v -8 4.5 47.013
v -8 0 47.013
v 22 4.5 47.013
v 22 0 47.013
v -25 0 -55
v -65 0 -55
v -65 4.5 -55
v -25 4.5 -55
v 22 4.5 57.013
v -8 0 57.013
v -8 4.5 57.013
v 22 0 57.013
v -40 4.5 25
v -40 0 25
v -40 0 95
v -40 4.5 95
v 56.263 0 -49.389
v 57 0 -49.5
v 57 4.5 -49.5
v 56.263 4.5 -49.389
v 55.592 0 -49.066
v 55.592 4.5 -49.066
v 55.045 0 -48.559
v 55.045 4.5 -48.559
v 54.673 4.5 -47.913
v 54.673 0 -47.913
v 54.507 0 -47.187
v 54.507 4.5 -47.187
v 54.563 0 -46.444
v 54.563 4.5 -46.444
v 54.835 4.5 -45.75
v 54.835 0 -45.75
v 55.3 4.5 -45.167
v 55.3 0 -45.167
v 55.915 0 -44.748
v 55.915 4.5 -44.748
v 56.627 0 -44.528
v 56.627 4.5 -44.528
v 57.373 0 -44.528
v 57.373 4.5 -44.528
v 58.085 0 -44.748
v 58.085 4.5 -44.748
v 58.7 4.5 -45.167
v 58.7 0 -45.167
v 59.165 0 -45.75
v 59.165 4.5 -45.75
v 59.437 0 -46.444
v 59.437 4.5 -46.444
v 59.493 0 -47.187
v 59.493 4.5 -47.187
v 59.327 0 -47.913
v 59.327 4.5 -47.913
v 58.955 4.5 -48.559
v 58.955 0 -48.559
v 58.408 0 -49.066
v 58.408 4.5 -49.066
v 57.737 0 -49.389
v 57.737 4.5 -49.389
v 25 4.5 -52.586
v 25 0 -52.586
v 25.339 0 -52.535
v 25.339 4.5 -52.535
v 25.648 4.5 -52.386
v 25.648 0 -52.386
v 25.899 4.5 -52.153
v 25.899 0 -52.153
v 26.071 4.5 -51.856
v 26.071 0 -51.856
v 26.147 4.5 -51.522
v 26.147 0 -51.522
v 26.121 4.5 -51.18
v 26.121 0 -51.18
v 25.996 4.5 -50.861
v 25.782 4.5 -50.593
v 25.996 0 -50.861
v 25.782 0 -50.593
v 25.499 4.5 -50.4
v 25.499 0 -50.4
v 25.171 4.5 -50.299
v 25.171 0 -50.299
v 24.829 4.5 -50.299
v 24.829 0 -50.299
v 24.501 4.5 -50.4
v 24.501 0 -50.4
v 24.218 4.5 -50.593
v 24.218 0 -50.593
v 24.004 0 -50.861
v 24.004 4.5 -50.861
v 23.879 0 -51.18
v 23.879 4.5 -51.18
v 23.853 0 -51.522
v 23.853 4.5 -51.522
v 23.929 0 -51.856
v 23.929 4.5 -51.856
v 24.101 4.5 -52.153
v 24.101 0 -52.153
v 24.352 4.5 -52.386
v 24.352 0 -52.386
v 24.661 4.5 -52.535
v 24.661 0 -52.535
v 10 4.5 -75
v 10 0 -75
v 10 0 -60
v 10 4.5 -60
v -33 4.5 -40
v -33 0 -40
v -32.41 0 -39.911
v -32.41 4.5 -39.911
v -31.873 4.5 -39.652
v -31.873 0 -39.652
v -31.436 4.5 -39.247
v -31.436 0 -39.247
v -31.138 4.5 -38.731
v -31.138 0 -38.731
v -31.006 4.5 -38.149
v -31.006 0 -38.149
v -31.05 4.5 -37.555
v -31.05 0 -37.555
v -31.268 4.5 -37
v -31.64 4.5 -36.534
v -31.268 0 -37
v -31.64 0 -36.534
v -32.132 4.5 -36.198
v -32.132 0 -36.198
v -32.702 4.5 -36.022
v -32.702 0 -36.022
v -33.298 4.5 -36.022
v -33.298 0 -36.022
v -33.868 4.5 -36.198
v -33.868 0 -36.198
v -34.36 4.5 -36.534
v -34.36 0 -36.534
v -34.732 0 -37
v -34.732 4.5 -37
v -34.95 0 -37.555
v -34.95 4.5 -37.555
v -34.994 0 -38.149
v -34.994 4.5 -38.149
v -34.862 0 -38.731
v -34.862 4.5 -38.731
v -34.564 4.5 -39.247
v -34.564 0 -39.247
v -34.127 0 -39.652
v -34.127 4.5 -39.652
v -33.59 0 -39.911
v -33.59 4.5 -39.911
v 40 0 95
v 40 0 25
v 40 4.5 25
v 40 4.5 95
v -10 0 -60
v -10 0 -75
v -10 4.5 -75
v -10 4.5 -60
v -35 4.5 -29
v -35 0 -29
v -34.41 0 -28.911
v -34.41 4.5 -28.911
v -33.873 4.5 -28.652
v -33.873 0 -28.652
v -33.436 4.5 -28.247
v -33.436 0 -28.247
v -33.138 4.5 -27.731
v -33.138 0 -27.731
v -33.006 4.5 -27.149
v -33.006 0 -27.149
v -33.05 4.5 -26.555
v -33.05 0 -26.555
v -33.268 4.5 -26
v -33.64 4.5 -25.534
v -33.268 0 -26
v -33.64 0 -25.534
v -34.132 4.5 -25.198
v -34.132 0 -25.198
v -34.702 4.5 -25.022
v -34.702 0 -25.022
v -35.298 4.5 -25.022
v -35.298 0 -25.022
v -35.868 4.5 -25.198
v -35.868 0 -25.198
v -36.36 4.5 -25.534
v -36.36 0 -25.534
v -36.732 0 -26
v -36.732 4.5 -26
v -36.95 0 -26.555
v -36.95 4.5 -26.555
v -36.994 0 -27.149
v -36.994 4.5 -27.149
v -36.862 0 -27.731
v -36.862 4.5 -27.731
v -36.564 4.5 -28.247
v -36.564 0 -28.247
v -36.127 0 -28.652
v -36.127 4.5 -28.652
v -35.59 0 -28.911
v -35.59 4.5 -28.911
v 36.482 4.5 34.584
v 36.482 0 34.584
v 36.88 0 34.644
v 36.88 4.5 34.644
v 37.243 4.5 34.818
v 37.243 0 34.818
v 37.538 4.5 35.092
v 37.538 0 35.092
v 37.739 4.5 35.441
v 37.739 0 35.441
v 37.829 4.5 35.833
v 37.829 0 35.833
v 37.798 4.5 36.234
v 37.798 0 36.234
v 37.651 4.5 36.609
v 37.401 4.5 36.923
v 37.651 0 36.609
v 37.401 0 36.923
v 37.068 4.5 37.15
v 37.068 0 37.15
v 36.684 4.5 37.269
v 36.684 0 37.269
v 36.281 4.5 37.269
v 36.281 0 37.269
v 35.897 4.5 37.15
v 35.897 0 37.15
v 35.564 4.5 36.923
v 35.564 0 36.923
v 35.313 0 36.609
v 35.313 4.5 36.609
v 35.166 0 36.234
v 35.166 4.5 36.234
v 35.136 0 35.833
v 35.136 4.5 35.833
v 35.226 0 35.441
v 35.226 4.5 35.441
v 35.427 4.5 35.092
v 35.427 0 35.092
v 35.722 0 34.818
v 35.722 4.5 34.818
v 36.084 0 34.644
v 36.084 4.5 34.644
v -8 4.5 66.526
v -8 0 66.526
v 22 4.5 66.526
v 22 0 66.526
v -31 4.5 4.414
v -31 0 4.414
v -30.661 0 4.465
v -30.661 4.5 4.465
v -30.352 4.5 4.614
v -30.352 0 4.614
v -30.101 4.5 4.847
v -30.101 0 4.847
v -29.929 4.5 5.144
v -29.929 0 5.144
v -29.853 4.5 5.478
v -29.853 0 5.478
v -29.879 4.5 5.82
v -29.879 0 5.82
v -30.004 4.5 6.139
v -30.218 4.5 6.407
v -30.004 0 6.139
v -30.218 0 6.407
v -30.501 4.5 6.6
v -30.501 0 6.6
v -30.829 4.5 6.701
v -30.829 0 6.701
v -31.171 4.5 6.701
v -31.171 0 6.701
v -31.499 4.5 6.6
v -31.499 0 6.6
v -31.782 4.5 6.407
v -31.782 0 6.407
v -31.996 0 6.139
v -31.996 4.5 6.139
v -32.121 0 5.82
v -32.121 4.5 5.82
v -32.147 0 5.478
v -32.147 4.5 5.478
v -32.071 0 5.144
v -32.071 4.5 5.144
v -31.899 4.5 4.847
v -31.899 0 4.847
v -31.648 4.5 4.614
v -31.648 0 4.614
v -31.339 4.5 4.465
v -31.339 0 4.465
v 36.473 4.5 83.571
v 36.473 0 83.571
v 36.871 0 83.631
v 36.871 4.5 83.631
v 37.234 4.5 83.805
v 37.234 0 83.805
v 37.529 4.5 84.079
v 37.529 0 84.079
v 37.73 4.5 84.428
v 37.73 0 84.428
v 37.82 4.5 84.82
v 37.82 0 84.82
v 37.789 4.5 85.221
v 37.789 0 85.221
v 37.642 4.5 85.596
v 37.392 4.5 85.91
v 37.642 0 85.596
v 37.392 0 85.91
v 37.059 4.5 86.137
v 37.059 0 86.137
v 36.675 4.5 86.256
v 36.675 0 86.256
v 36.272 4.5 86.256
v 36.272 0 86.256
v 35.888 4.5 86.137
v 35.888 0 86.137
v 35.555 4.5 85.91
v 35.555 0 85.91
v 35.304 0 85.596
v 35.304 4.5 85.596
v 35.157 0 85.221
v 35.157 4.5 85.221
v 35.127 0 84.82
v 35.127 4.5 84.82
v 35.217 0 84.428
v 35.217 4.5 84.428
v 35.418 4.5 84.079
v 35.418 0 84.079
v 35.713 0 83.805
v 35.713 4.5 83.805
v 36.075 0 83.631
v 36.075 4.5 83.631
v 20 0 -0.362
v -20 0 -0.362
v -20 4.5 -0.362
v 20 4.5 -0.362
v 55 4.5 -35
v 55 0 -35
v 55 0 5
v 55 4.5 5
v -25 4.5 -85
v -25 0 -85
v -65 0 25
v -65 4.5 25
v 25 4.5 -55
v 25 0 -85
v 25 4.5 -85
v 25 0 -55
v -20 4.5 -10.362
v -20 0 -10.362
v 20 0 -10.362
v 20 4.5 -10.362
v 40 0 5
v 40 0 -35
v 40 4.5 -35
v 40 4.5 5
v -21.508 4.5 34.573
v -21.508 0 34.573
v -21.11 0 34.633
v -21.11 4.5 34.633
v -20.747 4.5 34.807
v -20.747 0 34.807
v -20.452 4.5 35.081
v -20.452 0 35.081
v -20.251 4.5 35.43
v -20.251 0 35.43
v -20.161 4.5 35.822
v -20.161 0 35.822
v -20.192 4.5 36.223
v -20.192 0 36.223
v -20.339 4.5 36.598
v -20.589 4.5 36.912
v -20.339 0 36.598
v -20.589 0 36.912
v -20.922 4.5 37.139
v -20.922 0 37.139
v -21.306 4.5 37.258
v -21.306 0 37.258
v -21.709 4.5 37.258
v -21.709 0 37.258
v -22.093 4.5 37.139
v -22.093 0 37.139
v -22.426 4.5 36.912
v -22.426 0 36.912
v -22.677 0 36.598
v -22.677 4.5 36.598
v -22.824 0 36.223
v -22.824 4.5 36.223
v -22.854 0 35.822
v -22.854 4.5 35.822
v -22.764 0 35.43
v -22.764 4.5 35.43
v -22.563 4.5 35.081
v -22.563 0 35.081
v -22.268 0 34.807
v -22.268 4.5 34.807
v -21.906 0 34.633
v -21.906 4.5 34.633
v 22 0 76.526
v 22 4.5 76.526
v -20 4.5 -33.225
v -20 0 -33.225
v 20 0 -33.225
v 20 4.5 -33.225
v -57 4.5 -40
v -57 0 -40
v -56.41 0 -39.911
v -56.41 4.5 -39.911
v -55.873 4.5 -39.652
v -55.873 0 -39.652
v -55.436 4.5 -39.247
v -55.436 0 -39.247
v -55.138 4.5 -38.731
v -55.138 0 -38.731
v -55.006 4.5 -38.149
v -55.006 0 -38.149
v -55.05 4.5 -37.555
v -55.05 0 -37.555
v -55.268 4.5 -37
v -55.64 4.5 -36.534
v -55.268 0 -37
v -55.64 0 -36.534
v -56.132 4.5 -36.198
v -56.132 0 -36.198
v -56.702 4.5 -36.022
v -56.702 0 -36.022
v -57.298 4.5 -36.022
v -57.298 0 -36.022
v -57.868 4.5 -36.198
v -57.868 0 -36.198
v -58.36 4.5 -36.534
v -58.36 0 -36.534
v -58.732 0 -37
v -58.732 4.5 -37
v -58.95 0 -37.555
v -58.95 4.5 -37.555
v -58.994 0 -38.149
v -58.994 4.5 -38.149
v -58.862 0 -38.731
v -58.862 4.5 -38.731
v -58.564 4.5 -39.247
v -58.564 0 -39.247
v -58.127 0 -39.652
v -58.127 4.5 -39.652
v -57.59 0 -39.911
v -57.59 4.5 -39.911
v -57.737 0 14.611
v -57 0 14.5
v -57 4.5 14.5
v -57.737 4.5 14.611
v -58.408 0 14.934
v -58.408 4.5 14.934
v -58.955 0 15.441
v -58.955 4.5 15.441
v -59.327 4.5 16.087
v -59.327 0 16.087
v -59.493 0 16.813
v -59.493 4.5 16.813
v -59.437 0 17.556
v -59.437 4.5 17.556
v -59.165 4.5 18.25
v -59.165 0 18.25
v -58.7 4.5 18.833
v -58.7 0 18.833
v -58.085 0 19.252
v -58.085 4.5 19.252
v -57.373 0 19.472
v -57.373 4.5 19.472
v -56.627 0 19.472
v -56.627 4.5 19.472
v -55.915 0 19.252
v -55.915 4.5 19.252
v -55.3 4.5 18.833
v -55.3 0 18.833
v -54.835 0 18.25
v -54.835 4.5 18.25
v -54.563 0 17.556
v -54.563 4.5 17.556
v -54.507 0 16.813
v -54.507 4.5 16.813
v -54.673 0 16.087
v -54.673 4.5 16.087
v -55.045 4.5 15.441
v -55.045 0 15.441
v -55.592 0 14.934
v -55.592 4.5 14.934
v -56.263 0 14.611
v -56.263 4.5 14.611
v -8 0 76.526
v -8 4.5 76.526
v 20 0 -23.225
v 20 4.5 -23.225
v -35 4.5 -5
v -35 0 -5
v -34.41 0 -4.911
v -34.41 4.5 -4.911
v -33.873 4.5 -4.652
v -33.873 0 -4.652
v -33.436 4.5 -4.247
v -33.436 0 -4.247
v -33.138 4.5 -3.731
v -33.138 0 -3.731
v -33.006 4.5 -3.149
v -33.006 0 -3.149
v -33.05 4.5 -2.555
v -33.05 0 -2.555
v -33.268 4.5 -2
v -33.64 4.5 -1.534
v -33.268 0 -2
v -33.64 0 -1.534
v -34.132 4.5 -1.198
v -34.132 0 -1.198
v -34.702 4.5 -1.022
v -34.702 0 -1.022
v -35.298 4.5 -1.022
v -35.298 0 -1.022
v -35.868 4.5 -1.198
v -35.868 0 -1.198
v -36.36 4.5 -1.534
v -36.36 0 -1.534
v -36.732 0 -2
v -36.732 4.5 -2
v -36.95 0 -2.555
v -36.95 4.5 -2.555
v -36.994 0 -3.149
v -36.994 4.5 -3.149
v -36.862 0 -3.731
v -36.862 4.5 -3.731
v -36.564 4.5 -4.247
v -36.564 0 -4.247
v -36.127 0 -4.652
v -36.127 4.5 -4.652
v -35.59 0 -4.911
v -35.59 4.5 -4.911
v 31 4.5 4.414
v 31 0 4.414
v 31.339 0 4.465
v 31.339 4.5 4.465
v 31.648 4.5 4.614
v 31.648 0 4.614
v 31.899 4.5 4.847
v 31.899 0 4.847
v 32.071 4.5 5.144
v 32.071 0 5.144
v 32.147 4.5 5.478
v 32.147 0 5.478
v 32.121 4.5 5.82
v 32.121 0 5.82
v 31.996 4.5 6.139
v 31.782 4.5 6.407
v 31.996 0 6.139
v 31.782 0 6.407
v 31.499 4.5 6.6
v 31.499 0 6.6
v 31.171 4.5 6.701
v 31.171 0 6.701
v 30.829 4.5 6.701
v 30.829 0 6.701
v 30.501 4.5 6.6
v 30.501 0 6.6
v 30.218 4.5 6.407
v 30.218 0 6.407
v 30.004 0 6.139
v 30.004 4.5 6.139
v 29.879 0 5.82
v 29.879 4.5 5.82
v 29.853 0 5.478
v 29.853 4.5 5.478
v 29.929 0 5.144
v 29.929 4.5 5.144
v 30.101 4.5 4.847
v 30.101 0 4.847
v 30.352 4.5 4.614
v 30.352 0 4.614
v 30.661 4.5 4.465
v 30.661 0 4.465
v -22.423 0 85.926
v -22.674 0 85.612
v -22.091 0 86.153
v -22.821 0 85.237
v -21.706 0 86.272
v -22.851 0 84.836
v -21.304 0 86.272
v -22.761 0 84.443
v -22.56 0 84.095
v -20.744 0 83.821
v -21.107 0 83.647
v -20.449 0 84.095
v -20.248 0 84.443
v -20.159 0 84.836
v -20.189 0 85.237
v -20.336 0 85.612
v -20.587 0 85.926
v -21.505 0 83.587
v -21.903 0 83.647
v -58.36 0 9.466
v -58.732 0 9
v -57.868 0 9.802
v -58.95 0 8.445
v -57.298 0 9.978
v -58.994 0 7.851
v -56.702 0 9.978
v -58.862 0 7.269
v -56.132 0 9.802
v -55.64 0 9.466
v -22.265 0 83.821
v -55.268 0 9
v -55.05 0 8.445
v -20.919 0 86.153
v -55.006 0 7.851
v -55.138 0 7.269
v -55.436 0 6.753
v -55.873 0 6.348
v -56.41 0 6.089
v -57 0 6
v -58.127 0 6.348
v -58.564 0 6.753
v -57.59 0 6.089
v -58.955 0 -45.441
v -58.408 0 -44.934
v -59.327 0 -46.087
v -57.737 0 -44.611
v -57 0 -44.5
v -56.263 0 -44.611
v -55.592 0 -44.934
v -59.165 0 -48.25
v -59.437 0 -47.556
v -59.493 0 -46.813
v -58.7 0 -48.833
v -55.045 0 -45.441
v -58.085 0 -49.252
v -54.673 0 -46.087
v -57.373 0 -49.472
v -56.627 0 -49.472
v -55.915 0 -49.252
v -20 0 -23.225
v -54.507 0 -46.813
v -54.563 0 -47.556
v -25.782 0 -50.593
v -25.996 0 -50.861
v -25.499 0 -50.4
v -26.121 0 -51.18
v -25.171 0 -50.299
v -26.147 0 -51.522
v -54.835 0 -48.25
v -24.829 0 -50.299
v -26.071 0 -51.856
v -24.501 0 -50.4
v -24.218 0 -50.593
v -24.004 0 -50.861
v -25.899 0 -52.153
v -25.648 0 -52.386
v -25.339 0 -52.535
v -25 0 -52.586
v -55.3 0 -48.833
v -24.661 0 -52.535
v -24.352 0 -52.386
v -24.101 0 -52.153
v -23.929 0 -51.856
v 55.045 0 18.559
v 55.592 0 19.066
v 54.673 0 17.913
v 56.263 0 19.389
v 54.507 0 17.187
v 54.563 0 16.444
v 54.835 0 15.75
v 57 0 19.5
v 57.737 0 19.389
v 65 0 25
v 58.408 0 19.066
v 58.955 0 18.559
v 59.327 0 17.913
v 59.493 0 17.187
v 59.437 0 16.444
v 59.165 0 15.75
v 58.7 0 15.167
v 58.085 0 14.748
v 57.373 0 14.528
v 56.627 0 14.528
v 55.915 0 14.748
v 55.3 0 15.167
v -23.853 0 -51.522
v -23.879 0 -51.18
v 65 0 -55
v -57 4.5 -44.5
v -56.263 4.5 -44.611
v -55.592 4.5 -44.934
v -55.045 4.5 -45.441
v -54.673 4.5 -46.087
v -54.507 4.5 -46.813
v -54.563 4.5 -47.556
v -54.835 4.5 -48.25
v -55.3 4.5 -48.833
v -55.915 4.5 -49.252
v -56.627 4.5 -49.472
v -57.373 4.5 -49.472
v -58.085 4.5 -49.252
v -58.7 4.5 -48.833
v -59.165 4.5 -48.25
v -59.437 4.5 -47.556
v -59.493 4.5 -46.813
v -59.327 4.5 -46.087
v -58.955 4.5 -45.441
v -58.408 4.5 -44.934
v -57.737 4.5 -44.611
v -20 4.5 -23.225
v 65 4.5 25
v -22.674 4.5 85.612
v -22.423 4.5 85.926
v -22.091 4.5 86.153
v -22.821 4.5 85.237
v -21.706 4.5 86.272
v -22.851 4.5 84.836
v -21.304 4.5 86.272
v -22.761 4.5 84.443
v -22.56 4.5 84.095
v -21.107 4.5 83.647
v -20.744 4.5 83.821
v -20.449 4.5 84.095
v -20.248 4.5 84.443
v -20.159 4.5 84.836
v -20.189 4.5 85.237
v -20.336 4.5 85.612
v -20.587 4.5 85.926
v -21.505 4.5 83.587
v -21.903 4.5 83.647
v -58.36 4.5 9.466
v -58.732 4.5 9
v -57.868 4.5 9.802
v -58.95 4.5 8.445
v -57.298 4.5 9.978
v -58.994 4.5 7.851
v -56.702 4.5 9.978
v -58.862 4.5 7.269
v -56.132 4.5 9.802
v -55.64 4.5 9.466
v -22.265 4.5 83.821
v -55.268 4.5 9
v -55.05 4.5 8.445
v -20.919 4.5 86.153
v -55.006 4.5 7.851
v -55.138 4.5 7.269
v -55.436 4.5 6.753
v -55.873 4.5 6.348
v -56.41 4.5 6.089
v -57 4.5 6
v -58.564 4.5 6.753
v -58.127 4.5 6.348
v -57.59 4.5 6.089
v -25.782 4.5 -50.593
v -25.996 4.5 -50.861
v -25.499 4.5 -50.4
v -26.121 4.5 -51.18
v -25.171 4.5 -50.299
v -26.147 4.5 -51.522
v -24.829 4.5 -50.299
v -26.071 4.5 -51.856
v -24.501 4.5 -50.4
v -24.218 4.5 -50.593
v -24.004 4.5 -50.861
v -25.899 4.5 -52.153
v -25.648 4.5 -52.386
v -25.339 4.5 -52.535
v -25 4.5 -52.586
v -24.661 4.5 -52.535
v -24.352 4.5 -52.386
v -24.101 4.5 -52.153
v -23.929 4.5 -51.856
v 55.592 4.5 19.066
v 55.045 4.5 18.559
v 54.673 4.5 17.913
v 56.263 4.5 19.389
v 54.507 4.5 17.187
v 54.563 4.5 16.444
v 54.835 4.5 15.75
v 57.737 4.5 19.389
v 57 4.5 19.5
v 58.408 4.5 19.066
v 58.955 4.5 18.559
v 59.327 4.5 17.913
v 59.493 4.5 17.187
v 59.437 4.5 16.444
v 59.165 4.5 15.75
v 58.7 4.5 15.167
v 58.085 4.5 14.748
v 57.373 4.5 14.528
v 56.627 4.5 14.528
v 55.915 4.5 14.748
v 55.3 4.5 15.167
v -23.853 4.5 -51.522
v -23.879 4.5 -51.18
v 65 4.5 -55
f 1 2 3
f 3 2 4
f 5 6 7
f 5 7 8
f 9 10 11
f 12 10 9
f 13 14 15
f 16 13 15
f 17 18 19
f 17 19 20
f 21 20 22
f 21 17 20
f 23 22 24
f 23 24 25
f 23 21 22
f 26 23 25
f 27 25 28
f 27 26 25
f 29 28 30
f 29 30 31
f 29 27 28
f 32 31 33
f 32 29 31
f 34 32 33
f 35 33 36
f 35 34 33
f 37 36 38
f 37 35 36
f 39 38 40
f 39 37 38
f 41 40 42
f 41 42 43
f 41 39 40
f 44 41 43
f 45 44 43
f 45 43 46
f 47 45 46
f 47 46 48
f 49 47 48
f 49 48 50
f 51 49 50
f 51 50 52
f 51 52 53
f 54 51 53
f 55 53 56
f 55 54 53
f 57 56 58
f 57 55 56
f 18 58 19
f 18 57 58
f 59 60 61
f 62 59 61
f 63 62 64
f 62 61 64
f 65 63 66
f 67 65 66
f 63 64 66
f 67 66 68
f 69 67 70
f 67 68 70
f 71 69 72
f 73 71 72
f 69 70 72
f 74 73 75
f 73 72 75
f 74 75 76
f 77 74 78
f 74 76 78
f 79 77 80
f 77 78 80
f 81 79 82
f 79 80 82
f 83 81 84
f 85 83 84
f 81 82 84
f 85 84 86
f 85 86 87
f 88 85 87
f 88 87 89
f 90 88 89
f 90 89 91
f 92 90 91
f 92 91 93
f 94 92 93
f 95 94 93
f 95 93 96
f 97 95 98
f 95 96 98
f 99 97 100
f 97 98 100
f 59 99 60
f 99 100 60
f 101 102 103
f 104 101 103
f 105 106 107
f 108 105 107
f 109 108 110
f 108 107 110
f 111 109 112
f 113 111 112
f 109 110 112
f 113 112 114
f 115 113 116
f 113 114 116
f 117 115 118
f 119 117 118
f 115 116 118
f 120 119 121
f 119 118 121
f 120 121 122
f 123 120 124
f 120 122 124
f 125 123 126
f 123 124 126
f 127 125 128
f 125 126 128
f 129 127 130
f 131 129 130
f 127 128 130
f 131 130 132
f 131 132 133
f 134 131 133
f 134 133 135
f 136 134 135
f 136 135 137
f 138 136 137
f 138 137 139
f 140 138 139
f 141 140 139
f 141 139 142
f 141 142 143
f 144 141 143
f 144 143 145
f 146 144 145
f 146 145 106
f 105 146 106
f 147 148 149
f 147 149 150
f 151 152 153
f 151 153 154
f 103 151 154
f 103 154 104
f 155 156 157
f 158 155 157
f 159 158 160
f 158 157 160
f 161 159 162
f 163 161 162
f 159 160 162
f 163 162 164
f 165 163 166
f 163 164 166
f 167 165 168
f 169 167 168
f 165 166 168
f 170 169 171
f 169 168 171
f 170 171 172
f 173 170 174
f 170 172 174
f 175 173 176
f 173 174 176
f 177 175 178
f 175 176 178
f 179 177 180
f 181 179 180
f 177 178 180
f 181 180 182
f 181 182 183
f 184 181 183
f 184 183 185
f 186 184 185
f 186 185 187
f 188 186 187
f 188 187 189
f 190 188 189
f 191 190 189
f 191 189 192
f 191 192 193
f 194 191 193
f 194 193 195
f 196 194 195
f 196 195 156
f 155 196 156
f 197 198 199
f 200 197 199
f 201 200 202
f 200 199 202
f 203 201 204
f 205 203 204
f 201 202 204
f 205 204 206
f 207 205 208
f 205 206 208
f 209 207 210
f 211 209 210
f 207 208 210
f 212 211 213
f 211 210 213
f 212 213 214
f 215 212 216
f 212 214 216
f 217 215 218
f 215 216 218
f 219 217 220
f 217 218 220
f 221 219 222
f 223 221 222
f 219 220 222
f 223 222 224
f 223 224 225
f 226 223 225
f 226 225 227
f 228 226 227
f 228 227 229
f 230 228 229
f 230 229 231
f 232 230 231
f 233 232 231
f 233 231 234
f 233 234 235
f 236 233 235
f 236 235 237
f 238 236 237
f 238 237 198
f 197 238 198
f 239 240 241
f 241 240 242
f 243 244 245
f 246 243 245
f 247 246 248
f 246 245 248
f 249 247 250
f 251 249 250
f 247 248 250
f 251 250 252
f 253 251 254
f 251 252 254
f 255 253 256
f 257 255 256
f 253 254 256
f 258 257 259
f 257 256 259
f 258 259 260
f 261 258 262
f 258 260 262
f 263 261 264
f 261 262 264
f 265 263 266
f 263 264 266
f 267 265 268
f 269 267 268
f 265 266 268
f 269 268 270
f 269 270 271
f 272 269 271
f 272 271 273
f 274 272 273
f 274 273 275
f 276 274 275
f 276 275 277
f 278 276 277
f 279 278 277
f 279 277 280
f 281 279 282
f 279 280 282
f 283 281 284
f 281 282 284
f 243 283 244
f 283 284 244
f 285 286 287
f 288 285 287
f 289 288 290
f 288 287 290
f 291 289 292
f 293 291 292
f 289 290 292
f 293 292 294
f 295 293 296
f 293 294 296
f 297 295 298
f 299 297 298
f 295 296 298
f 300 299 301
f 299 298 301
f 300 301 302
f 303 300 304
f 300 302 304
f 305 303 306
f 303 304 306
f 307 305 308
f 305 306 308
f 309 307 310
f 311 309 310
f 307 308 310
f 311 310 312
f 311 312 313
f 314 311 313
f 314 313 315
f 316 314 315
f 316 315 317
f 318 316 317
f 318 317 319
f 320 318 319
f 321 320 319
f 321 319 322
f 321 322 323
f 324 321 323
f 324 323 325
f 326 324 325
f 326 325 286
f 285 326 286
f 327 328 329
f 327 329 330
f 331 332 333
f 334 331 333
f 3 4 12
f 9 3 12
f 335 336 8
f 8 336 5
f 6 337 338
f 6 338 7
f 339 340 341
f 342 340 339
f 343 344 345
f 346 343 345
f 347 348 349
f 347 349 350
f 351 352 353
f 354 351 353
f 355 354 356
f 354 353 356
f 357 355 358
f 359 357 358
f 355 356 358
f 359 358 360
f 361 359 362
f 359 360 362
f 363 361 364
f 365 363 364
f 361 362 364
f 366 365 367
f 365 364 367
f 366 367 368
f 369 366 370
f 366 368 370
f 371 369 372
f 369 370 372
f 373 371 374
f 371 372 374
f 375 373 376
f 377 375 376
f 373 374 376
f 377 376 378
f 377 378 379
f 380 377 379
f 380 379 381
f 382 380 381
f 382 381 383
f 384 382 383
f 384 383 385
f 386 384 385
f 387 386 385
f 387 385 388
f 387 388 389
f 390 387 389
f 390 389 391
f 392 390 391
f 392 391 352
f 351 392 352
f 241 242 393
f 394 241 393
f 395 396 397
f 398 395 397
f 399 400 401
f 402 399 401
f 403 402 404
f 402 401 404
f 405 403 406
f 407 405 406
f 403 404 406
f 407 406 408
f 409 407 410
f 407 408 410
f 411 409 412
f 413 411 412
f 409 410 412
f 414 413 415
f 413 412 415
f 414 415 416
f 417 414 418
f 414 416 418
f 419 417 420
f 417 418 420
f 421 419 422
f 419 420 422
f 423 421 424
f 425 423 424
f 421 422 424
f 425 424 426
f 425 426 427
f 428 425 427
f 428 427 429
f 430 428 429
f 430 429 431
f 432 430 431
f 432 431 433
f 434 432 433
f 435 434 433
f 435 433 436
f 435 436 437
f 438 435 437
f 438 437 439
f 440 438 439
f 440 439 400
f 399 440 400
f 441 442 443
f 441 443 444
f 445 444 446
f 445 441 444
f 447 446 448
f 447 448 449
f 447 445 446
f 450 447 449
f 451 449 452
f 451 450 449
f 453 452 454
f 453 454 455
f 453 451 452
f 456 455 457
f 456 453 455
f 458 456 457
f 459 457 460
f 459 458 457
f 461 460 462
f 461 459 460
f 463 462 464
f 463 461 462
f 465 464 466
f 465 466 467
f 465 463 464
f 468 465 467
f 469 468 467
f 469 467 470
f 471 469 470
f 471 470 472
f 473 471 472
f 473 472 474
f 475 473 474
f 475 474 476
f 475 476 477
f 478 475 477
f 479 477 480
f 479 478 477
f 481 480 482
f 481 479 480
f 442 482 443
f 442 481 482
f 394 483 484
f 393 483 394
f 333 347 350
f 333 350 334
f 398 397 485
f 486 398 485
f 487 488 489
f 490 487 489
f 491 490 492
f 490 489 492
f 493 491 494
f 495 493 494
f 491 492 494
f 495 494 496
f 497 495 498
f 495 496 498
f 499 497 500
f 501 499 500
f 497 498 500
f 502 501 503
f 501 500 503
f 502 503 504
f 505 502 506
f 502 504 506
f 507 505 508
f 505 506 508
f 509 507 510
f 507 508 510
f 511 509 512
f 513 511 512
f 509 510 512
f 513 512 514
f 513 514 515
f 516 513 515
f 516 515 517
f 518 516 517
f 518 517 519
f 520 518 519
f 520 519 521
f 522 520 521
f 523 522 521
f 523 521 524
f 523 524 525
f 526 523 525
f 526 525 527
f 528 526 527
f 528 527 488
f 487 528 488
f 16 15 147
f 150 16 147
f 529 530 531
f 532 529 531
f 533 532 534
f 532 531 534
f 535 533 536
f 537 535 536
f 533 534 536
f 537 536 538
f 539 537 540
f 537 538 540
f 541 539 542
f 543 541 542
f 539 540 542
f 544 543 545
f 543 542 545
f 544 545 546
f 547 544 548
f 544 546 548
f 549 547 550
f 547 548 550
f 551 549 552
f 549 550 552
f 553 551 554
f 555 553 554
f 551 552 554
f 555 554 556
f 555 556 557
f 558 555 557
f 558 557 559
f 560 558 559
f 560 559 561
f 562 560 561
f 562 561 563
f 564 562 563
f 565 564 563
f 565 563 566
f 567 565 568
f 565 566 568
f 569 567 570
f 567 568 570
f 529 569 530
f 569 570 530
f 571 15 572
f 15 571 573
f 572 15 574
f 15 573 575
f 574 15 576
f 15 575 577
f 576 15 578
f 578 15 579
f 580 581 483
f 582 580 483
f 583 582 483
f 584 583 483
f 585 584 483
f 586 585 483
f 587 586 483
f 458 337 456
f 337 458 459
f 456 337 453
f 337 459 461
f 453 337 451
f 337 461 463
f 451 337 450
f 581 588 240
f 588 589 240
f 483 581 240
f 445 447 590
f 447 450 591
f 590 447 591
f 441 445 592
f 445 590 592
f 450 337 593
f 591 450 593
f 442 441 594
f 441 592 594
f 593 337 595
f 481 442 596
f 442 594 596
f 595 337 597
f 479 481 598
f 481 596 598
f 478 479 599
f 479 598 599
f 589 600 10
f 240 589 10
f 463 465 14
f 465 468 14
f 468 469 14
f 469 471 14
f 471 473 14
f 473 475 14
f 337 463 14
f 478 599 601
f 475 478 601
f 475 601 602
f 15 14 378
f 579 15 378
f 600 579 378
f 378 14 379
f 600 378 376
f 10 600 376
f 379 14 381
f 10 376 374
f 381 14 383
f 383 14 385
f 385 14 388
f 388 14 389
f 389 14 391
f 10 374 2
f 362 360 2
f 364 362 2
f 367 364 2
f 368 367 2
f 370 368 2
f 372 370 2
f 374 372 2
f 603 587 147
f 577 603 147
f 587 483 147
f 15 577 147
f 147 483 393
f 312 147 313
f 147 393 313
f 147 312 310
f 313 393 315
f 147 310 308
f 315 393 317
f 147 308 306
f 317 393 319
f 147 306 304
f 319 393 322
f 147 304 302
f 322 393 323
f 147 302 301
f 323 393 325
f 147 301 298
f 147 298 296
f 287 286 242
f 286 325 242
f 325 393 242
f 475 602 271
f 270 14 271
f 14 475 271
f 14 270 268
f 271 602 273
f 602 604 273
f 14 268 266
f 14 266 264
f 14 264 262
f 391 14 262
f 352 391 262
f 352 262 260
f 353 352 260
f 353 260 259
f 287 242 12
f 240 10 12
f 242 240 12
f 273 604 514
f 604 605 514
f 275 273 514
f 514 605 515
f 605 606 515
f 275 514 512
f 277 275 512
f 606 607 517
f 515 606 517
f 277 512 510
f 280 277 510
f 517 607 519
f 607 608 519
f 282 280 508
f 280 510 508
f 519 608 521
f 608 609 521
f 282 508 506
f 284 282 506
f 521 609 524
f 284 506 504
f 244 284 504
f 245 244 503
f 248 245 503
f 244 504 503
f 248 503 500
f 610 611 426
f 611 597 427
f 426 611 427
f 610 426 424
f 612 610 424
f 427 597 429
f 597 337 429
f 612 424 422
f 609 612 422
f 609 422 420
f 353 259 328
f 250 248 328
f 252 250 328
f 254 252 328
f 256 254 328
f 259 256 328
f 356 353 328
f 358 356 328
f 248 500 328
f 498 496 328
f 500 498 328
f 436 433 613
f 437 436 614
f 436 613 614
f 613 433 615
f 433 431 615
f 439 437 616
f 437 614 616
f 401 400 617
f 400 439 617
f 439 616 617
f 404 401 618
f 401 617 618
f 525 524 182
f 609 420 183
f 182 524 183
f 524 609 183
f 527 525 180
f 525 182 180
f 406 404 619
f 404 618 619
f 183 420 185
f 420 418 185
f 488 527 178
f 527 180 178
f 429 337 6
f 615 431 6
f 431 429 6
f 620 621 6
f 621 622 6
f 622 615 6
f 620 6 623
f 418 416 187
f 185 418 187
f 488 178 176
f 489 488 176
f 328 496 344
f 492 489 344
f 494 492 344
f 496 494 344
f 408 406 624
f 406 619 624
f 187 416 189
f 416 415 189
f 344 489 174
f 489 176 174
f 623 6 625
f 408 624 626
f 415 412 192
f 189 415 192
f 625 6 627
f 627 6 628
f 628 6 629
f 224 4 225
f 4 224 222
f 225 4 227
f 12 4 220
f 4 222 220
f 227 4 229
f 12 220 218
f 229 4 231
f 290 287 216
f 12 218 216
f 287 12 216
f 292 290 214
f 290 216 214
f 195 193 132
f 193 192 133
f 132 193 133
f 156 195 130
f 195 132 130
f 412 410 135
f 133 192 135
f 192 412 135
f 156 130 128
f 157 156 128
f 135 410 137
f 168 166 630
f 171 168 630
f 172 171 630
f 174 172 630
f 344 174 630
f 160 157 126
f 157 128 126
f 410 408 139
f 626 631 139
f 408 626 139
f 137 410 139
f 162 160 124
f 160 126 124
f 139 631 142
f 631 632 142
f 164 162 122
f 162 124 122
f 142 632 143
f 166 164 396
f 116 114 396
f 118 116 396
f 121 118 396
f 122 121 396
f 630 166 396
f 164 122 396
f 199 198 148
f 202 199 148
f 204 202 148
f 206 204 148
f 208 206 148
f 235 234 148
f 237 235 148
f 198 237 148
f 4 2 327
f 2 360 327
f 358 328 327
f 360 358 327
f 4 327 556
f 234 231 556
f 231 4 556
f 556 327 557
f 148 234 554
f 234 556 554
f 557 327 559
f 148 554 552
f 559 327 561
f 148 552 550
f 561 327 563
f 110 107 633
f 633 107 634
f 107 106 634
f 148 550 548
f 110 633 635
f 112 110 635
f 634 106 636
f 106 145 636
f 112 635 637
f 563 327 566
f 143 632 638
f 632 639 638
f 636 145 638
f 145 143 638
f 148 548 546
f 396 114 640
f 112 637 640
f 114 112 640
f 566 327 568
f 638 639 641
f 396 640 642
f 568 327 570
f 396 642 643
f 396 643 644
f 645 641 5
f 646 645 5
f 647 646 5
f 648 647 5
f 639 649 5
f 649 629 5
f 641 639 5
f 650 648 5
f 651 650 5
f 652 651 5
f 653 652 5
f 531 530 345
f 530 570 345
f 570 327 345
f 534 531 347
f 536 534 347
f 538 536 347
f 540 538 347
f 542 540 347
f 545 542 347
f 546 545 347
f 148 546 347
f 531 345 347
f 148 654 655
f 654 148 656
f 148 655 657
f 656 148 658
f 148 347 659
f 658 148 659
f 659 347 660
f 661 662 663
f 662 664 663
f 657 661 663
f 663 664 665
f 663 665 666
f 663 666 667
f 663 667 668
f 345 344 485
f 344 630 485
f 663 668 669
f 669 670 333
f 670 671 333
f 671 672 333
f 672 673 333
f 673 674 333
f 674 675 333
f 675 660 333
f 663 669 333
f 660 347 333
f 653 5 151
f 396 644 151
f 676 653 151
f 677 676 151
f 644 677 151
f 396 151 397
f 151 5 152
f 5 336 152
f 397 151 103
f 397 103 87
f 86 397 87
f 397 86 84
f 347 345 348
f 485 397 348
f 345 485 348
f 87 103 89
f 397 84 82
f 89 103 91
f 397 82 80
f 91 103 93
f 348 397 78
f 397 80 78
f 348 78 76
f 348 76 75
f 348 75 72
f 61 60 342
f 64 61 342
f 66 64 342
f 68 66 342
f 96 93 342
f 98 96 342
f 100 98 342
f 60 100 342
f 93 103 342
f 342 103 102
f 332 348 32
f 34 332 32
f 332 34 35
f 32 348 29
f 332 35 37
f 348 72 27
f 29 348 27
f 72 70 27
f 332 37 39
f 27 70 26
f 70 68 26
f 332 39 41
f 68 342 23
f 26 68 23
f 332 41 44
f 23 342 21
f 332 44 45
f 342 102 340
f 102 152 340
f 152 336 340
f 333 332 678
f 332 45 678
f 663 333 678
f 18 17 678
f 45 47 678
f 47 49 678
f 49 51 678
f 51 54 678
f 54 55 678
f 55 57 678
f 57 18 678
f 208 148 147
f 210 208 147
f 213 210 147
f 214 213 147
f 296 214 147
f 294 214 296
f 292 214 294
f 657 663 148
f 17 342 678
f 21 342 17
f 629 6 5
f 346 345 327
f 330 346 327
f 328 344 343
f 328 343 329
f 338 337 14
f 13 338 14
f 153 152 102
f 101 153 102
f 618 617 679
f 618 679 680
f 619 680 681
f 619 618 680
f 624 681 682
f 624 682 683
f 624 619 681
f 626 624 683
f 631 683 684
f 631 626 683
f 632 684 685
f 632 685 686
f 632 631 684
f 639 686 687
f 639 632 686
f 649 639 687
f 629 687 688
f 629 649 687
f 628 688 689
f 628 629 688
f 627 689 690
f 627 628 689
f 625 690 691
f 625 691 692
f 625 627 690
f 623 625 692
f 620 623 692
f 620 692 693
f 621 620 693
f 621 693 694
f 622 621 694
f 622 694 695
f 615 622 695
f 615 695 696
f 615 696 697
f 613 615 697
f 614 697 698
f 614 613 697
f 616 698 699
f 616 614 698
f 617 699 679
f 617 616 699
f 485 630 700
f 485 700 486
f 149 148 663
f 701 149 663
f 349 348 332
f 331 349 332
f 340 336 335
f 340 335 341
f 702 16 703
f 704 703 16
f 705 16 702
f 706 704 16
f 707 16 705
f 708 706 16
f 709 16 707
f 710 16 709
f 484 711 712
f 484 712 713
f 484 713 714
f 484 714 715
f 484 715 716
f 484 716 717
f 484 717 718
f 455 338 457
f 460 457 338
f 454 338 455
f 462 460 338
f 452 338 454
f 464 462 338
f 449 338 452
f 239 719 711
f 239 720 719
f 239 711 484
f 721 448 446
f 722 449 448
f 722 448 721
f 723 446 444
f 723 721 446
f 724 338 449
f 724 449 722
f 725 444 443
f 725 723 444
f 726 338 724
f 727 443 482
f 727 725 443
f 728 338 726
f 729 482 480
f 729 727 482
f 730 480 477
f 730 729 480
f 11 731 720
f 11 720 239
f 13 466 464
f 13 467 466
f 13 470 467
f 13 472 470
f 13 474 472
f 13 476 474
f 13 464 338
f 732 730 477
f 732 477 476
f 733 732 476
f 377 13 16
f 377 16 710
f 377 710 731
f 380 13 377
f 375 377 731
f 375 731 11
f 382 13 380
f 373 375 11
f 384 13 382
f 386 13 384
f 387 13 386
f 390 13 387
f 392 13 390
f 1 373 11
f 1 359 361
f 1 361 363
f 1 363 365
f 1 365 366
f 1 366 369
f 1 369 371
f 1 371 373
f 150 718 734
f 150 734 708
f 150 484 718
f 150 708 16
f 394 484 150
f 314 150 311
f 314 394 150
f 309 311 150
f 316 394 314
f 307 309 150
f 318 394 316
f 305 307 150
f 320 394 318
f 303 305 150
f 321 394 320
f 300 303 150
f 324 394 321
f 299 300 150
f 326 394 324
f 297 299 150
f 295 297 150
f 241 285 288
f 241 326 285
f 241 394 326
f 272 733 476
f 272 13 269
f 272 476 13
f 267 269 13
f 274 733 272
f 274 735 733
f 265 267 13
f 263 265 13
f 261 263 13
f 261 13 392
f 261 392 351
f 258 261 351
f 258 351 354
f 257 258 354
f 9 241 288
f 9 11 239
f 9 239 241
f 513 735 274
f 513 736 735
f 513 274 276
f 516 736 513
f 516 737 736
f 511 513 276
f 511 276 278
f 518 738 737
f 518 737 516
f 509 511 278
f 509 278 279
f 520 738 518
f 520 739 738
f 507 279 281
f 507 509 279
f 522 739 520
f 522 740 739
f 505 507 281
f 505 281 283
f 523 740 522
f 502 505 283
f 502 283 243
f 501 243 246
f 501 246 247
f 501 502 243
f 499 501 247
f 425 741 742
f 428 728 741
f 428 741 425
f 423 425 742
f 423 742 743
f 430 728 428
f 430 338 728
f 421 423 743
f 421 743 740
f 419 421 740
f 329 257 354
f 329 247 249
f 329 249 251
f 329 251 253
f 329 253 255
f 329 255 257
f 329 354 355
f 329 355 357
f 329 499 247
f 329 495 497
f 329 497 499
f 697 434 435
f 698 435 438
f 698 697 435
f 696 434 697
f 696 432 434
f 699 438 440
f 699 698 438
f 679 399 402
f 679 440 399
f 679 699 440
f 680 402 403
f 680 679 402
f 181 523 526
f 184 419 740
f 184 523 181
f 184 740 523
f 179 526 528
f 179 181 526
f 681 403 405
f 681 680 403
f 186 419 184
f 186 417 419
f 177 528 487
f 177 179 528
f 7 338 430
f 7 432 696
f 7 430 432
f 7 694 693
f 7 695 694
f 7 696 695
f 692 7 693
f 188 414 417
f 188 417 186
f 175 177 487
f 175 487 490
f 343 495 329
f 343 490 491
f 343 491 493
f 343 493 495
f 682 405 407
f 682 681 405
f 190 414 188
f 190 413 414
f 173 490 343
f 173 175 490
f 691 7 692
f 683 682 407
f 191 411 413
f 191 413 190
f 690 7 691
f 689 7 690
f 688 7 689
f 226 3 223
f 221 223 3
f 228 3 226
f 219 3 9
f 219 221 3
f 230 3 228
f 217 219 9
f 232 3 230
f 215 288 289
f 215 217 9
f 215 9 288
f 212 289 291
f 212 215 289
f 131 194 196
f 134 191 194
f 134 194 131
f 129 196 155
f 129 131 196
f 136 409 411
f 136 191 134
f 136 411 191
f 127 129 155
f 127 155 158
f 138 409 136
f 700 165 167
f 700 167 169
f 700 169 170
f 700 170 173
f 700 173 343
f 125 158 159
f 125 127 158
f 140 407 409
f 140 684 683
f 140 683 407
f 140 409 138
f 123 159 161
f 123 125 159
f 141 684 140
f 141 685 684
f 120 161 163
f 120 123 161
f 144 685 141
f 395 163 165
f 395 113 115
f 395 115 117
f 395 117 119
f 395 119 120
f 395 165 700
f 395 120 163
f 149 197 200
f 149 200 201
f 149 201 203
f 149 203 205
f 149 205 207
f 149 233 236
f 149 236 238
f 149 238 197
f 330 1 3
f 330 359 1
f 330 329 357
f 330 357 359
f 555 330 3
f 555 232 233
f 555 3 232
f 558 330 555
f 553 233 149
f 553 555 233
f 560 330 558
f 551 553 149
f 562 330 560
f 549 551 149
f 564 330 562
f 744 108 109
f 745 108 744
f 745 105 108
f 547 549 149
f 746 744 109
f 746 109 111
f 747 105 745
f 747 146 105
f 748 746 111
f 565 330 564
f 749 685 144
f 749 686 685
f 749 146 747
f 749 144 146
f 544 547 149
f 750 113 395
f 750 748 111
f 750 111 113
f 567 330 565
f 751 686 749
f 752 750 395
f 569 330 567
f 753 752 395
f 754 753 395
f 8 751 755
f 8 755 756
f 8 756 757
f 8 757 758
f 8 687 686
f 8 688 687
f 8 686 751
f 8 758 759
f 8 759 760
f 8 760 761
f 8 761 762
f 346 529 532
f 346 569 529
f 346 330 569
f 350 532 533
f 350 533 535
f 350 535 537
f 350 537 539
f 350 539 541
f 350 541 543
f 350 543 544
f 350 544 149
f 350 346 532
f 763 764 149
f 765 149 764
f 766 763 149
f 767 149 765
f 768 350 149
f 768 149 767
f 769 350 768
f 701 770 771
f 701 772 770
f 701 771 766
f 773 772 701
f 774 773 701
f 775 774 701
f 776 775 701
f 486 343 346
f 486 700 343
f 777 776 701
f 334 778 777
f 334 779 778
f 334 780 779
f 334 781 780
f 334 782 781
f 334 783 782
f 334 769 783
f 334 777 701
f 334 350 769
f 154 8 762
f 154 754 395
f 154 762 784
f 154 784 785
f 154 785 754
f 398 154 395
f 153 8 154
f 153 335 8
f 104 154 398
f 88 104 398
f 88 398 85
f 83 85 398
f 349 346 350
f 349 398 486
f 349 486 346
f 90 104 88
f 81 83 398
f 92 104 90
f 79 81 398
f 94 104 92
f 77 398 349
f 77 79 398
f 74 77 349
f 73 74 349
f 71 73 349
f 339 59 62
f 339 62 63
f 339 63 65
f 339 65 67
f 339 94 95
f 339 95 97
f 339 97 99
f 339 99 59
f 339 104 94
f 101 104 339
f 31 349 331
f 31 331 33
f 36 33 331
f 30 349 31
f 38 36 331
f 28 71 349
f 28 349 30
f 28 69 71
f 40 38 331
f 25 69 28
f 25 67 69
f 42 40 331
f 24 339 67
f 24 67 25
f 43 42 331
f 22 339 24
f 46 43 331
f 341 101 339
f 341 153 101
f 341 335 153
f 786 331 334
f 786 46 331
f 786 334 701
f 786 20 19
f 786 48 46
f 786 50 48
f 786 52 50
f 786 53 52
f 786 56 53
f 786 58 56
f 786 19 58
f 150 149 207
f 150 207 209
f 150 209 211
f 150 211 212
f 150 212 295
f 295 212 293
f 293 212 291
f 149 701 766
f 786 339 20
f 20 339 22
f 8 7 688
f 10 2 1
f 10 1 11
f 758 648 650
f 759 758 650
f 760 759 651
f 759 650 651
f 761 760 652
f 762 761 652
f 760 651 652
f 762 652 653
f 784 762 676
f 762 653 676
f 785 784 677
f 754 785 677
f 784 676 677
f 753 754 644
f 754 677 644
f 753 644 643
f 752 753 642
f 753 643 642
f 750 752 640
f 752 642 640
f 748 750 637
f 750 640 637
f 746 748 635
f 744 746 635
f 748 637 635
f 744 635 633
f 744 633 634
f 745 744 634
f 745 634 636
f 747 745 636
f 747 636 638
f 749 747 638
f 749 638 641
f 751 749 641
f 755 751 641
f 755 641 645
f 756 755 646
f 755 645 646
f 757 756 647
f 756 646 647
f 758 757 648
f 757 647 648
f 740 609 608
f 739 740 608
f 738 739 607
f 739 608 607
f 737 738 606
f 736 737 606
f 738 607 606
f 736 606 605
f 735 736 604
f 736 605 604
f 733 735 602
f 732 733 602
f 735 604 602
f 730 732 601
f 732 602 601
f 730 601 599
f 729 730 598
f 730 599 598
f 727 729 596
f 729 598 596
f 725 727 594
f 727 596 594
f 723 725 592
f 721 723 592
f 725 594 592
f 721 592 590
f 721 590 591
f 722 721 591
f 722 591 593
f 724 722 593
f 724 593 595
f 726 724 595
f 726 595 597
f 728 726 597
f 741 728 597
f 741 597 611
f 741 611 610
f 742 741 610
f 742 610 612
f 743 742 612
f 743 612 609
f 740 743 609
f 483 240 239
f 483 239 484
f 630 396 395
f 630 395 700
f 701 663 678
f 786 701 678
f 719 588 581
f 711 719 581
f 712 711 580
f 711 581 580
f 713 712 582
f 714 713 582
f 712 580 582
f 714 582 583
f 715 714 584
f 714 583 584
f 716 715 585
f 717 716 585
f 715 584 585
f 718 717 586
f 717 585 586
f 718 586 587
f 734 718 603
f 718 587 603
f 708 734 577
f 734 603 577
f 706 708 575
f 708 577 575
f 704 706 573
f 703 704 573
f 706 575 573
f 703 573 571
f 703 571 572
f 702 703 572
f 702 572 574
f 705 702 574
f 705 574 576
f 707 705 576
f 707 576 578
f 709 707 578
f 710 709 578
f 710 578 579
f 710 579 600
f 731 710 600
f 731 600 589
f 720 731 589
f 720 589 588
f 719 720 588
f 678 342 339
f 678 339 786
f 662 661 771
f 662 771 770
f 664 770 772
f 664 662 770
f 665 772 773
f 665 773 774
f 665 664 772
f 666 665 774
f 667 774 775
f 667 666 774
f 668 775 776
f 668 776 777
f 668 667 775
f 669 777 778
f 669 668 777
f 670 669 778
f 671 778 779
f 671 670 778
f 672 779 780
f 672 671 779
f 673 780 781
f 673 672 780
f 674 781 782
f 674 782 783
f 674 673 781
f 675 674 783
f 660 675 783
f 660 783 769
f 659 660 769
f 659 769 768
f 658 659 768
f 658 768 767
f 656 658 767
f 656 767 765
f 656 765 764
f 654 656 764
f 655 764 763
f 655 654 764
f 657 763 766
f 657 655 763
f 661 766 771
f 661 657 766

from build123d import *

# Parameters (mm, degrees)
SKETCH_2_W          = 130
SKETCH_2_H          = 80
SKETCH_2_R          = 2.5
EXTRUDE_1_DEPTH     = 4.5
SKETCH_4_W          = 80
SKETCH_4_H          = 70
EXTRUDE_2_DEPTH     = 4.5
SKETCH_6_R          = 1.15
CUT_EXTRUDE_2_DEPTH = 4.5
SKETCH_7_R          = 1.15
CUT_EXTRUDE_3_DEPTH = 4.5
SKETCH_8_R          = 1.35
CUT_EXTRUDE_4_DEPTH = 10
SKETCH_9_W          = 40
SKETCH_9_H          = 10
SKETCH_9_W_2        = 30
CUT_EXTRUDE_5_DEPTH = 10
SKETCH_11_W         = 50
SKETCH_11_H         = 30
EXTRUDE_3_DEPTH     = 4.5
SKETCH_12_W         = 20
SKETCH_12_H         = 15
CUT_EXTRUDE_6_DEPTH = 10
SKETCH_13_R         = 2
CUT_EXTRUDE_7_DEPTH = 10
SKETCH_14_R         = 2
CUT_EXTRUDE_8_DEPTH = 10
SKETCH_15_W         = 15
SKETCH_15_H         = 40
CUT_EXTRUDE_9_DEPTH = 10


with BuildPart() as part:
    # 草图2 → 凸台-拉伸1 (new body)
    with BuildSketch(Plane(origin=(0, 0, 0), x_dir=(1, 0, 0), z_dir=(0, 1, 0))):
        with Locations((0, 15)):
            Rectangle(SKETCH_2_W, SKETCH_2_H)
        with Locations(Location((-57, 47, 0), (0, 0, 270))):
            Circle(SKETCH_2_R, mode=Mode.SUBTRACT)
        with Locations(Location((57, 47, 0), (0, 0, 90))):
            Circle(SKETCH_2_R, mode=Mode.SUBTRACT)
        with Locations(Location((57, -17, 0), (0, 0, 270))):
            Circle(SKETCH_2_R, mode=Mode.SUBTRACT)
        with Locations(Location((-57, -17, 0), (0, 0, 90))):
            Circle(SKETCH_2_R, mode=Mode.SUBTRACT)
    extrude(amount=EXTRUDE_1_DEPTH)

    # 草图4 → 凸台-拉伸2 (add)
    with BuildSketch(Plane.XZ):
        with Locations((0, 60)):
            Rectangle(SKETCH_4_W, SKETCH_4_H)
    extrude(amount=-EXTRUDE_2_DEPTH)

    # 草图6 → 切除-拉伸2 (cut)
    with BuildSketch(Plane.XZ):
        with Locations(Location((-31, 5.56384156, 0), (0, 0, 270))):
            Circle(SKETCH_6_R)
        with Locations(Location((31, 5.56384156, 0), (0, 0, 270))):
            Circle(SKETCH_6_R)
    extrude(amount=-CUT_EXTRUDE_2_DEPTH, mode=Mode.SUBTRACT)

    # 草图7 → 切除-拉伸3 (cut)
    with BuildSketch(Plane.XZ):
        with Locations(Location((31, 5.56384156, 0), (0, 0, 270))):
            Circle(SKETCH_7_R)
        with Locations(Location((-25, -51.43615844, 0), (0, 0, 270))):
            Circle(SKETCH_7_R)
        with Locations(Location((25, -51.43615844, 0), (0, 0, 270))):
            Circle(SKETCH_7_R)
    extrude(amount=-CUT_EXTRUDE_3_DEPTH, mode=Mode.SUBTRACT)

    # 草图8 → 切除-拉伸4 (cut)
    with BuildSketch(Plane.XZ):
        with Locations(Location((-21.50477, 84.936614939, 0), (0, 0, 270))):
            Circle(SKETCH_8_R)
        with Locations(Location((36.4733, 84.920764939, 0), (0, 0, 270))):
            Circle(SKETCH_8_R)
        with Locations(Location((36.4823, 35.933764939, 0), (0, 0, 270))):
            Circle(SKETCH_8_R)
        with Locations(Location((-21.5077, 35.922764939, 0), (0, 0, 270))):
            Circle(SKETCH_8_R)
    extrude(amount=-CUT_EXTRUDE_4_DEPTH, mode=Mode.SUBTRACT)

    # 草图9 → 切除-拉伸5 (cut)
    with BuildSketch(Plane.XZ):
        with Locations((0, -5.362073184)):
            Rectangle(SKETCH_9_W, SKETCH_9_H)
        with Locations((0, -28.22464148)):
            Rectangle(SKETCH_9_W, SKETCH_9_H)
        with Locations((7, 71.526054591)):
            Rectangle(SKETCH_9_W_2, SKETCH_9_H)
        with Locations((7, 52.012779739)):
            Rectangle(SKETCH_9_W_2, SKETCH_9_H)
    extrude(amount=-CUT_EXTRUDE_5_DEPTH, mode=Mode.SUBTRACT)

    # 草图11 → 凸台-拉伸3 (add)
    with BuildSketch(Plane.XZ):
        with Locations((0, -70)):
            Rectangle(SKETCH_11_W, SKETCH_11_H)
    extrude(amount=-EXTRUDE_3_DEPTH)

    # 草图12 → 切除-拉伸6 (cut)
    with BuildSketch(Plane.XZ):
        with Locations((0, -67.5)):
            Rectangle(SKETCH_12_W, SKETCH_12_H)
    extrude(amount=-CUT_EXTRUDE_6_DEPTH, mode=Mode.SUBTRACT)

    # 草图13 → 切除-拉伸7 (cut)
    with BuildSketch(Plane.XZ):
        with Locations(Location((-57, 8, 0), (0, 0, 270))):
            Circle(SKETCH_13_R)
        with Locations(Location((-57, -38, 0), (0, 0, 270))):
            Circle(SKETCH_13_R)
        with Locations(Location((-33, -38, 0), (0, 0, 270))):
            Circle(SKETCH_13_R)
    extrude(amount=-CUT_EXTRUDE_7_DEPTH, mode=Mode.SUBTRACT)

    # 草图14 → 切除-拉伸8 (cut)
    with BuildSketch(Plane.XZ):
        with Locations(Location((-35, -27, 0), (0, 0, 270))):
            Circle(SKETCH_14_R)
        with Locations(Location((-35, -3, 0), (0, 0, 270))):
            Circle(SKETCH_14_R)
    extrude(amount=-CUT_EXTRUDE_8_DEPTH, mode=Mode.SUBTRACT)

    # 草图15 → 切除-拉伸9 (cut)
    with BuildSketch(Plane.XZ):
        with Locations((47.5, -15)):
            Rectangle(SKETCH_15_W, SKETCH_15_H)
    extrude(amount=-CUT_EXTRUDE_9_DEPTH, mode=Mode.SUBTRACT)


solid = part.part
